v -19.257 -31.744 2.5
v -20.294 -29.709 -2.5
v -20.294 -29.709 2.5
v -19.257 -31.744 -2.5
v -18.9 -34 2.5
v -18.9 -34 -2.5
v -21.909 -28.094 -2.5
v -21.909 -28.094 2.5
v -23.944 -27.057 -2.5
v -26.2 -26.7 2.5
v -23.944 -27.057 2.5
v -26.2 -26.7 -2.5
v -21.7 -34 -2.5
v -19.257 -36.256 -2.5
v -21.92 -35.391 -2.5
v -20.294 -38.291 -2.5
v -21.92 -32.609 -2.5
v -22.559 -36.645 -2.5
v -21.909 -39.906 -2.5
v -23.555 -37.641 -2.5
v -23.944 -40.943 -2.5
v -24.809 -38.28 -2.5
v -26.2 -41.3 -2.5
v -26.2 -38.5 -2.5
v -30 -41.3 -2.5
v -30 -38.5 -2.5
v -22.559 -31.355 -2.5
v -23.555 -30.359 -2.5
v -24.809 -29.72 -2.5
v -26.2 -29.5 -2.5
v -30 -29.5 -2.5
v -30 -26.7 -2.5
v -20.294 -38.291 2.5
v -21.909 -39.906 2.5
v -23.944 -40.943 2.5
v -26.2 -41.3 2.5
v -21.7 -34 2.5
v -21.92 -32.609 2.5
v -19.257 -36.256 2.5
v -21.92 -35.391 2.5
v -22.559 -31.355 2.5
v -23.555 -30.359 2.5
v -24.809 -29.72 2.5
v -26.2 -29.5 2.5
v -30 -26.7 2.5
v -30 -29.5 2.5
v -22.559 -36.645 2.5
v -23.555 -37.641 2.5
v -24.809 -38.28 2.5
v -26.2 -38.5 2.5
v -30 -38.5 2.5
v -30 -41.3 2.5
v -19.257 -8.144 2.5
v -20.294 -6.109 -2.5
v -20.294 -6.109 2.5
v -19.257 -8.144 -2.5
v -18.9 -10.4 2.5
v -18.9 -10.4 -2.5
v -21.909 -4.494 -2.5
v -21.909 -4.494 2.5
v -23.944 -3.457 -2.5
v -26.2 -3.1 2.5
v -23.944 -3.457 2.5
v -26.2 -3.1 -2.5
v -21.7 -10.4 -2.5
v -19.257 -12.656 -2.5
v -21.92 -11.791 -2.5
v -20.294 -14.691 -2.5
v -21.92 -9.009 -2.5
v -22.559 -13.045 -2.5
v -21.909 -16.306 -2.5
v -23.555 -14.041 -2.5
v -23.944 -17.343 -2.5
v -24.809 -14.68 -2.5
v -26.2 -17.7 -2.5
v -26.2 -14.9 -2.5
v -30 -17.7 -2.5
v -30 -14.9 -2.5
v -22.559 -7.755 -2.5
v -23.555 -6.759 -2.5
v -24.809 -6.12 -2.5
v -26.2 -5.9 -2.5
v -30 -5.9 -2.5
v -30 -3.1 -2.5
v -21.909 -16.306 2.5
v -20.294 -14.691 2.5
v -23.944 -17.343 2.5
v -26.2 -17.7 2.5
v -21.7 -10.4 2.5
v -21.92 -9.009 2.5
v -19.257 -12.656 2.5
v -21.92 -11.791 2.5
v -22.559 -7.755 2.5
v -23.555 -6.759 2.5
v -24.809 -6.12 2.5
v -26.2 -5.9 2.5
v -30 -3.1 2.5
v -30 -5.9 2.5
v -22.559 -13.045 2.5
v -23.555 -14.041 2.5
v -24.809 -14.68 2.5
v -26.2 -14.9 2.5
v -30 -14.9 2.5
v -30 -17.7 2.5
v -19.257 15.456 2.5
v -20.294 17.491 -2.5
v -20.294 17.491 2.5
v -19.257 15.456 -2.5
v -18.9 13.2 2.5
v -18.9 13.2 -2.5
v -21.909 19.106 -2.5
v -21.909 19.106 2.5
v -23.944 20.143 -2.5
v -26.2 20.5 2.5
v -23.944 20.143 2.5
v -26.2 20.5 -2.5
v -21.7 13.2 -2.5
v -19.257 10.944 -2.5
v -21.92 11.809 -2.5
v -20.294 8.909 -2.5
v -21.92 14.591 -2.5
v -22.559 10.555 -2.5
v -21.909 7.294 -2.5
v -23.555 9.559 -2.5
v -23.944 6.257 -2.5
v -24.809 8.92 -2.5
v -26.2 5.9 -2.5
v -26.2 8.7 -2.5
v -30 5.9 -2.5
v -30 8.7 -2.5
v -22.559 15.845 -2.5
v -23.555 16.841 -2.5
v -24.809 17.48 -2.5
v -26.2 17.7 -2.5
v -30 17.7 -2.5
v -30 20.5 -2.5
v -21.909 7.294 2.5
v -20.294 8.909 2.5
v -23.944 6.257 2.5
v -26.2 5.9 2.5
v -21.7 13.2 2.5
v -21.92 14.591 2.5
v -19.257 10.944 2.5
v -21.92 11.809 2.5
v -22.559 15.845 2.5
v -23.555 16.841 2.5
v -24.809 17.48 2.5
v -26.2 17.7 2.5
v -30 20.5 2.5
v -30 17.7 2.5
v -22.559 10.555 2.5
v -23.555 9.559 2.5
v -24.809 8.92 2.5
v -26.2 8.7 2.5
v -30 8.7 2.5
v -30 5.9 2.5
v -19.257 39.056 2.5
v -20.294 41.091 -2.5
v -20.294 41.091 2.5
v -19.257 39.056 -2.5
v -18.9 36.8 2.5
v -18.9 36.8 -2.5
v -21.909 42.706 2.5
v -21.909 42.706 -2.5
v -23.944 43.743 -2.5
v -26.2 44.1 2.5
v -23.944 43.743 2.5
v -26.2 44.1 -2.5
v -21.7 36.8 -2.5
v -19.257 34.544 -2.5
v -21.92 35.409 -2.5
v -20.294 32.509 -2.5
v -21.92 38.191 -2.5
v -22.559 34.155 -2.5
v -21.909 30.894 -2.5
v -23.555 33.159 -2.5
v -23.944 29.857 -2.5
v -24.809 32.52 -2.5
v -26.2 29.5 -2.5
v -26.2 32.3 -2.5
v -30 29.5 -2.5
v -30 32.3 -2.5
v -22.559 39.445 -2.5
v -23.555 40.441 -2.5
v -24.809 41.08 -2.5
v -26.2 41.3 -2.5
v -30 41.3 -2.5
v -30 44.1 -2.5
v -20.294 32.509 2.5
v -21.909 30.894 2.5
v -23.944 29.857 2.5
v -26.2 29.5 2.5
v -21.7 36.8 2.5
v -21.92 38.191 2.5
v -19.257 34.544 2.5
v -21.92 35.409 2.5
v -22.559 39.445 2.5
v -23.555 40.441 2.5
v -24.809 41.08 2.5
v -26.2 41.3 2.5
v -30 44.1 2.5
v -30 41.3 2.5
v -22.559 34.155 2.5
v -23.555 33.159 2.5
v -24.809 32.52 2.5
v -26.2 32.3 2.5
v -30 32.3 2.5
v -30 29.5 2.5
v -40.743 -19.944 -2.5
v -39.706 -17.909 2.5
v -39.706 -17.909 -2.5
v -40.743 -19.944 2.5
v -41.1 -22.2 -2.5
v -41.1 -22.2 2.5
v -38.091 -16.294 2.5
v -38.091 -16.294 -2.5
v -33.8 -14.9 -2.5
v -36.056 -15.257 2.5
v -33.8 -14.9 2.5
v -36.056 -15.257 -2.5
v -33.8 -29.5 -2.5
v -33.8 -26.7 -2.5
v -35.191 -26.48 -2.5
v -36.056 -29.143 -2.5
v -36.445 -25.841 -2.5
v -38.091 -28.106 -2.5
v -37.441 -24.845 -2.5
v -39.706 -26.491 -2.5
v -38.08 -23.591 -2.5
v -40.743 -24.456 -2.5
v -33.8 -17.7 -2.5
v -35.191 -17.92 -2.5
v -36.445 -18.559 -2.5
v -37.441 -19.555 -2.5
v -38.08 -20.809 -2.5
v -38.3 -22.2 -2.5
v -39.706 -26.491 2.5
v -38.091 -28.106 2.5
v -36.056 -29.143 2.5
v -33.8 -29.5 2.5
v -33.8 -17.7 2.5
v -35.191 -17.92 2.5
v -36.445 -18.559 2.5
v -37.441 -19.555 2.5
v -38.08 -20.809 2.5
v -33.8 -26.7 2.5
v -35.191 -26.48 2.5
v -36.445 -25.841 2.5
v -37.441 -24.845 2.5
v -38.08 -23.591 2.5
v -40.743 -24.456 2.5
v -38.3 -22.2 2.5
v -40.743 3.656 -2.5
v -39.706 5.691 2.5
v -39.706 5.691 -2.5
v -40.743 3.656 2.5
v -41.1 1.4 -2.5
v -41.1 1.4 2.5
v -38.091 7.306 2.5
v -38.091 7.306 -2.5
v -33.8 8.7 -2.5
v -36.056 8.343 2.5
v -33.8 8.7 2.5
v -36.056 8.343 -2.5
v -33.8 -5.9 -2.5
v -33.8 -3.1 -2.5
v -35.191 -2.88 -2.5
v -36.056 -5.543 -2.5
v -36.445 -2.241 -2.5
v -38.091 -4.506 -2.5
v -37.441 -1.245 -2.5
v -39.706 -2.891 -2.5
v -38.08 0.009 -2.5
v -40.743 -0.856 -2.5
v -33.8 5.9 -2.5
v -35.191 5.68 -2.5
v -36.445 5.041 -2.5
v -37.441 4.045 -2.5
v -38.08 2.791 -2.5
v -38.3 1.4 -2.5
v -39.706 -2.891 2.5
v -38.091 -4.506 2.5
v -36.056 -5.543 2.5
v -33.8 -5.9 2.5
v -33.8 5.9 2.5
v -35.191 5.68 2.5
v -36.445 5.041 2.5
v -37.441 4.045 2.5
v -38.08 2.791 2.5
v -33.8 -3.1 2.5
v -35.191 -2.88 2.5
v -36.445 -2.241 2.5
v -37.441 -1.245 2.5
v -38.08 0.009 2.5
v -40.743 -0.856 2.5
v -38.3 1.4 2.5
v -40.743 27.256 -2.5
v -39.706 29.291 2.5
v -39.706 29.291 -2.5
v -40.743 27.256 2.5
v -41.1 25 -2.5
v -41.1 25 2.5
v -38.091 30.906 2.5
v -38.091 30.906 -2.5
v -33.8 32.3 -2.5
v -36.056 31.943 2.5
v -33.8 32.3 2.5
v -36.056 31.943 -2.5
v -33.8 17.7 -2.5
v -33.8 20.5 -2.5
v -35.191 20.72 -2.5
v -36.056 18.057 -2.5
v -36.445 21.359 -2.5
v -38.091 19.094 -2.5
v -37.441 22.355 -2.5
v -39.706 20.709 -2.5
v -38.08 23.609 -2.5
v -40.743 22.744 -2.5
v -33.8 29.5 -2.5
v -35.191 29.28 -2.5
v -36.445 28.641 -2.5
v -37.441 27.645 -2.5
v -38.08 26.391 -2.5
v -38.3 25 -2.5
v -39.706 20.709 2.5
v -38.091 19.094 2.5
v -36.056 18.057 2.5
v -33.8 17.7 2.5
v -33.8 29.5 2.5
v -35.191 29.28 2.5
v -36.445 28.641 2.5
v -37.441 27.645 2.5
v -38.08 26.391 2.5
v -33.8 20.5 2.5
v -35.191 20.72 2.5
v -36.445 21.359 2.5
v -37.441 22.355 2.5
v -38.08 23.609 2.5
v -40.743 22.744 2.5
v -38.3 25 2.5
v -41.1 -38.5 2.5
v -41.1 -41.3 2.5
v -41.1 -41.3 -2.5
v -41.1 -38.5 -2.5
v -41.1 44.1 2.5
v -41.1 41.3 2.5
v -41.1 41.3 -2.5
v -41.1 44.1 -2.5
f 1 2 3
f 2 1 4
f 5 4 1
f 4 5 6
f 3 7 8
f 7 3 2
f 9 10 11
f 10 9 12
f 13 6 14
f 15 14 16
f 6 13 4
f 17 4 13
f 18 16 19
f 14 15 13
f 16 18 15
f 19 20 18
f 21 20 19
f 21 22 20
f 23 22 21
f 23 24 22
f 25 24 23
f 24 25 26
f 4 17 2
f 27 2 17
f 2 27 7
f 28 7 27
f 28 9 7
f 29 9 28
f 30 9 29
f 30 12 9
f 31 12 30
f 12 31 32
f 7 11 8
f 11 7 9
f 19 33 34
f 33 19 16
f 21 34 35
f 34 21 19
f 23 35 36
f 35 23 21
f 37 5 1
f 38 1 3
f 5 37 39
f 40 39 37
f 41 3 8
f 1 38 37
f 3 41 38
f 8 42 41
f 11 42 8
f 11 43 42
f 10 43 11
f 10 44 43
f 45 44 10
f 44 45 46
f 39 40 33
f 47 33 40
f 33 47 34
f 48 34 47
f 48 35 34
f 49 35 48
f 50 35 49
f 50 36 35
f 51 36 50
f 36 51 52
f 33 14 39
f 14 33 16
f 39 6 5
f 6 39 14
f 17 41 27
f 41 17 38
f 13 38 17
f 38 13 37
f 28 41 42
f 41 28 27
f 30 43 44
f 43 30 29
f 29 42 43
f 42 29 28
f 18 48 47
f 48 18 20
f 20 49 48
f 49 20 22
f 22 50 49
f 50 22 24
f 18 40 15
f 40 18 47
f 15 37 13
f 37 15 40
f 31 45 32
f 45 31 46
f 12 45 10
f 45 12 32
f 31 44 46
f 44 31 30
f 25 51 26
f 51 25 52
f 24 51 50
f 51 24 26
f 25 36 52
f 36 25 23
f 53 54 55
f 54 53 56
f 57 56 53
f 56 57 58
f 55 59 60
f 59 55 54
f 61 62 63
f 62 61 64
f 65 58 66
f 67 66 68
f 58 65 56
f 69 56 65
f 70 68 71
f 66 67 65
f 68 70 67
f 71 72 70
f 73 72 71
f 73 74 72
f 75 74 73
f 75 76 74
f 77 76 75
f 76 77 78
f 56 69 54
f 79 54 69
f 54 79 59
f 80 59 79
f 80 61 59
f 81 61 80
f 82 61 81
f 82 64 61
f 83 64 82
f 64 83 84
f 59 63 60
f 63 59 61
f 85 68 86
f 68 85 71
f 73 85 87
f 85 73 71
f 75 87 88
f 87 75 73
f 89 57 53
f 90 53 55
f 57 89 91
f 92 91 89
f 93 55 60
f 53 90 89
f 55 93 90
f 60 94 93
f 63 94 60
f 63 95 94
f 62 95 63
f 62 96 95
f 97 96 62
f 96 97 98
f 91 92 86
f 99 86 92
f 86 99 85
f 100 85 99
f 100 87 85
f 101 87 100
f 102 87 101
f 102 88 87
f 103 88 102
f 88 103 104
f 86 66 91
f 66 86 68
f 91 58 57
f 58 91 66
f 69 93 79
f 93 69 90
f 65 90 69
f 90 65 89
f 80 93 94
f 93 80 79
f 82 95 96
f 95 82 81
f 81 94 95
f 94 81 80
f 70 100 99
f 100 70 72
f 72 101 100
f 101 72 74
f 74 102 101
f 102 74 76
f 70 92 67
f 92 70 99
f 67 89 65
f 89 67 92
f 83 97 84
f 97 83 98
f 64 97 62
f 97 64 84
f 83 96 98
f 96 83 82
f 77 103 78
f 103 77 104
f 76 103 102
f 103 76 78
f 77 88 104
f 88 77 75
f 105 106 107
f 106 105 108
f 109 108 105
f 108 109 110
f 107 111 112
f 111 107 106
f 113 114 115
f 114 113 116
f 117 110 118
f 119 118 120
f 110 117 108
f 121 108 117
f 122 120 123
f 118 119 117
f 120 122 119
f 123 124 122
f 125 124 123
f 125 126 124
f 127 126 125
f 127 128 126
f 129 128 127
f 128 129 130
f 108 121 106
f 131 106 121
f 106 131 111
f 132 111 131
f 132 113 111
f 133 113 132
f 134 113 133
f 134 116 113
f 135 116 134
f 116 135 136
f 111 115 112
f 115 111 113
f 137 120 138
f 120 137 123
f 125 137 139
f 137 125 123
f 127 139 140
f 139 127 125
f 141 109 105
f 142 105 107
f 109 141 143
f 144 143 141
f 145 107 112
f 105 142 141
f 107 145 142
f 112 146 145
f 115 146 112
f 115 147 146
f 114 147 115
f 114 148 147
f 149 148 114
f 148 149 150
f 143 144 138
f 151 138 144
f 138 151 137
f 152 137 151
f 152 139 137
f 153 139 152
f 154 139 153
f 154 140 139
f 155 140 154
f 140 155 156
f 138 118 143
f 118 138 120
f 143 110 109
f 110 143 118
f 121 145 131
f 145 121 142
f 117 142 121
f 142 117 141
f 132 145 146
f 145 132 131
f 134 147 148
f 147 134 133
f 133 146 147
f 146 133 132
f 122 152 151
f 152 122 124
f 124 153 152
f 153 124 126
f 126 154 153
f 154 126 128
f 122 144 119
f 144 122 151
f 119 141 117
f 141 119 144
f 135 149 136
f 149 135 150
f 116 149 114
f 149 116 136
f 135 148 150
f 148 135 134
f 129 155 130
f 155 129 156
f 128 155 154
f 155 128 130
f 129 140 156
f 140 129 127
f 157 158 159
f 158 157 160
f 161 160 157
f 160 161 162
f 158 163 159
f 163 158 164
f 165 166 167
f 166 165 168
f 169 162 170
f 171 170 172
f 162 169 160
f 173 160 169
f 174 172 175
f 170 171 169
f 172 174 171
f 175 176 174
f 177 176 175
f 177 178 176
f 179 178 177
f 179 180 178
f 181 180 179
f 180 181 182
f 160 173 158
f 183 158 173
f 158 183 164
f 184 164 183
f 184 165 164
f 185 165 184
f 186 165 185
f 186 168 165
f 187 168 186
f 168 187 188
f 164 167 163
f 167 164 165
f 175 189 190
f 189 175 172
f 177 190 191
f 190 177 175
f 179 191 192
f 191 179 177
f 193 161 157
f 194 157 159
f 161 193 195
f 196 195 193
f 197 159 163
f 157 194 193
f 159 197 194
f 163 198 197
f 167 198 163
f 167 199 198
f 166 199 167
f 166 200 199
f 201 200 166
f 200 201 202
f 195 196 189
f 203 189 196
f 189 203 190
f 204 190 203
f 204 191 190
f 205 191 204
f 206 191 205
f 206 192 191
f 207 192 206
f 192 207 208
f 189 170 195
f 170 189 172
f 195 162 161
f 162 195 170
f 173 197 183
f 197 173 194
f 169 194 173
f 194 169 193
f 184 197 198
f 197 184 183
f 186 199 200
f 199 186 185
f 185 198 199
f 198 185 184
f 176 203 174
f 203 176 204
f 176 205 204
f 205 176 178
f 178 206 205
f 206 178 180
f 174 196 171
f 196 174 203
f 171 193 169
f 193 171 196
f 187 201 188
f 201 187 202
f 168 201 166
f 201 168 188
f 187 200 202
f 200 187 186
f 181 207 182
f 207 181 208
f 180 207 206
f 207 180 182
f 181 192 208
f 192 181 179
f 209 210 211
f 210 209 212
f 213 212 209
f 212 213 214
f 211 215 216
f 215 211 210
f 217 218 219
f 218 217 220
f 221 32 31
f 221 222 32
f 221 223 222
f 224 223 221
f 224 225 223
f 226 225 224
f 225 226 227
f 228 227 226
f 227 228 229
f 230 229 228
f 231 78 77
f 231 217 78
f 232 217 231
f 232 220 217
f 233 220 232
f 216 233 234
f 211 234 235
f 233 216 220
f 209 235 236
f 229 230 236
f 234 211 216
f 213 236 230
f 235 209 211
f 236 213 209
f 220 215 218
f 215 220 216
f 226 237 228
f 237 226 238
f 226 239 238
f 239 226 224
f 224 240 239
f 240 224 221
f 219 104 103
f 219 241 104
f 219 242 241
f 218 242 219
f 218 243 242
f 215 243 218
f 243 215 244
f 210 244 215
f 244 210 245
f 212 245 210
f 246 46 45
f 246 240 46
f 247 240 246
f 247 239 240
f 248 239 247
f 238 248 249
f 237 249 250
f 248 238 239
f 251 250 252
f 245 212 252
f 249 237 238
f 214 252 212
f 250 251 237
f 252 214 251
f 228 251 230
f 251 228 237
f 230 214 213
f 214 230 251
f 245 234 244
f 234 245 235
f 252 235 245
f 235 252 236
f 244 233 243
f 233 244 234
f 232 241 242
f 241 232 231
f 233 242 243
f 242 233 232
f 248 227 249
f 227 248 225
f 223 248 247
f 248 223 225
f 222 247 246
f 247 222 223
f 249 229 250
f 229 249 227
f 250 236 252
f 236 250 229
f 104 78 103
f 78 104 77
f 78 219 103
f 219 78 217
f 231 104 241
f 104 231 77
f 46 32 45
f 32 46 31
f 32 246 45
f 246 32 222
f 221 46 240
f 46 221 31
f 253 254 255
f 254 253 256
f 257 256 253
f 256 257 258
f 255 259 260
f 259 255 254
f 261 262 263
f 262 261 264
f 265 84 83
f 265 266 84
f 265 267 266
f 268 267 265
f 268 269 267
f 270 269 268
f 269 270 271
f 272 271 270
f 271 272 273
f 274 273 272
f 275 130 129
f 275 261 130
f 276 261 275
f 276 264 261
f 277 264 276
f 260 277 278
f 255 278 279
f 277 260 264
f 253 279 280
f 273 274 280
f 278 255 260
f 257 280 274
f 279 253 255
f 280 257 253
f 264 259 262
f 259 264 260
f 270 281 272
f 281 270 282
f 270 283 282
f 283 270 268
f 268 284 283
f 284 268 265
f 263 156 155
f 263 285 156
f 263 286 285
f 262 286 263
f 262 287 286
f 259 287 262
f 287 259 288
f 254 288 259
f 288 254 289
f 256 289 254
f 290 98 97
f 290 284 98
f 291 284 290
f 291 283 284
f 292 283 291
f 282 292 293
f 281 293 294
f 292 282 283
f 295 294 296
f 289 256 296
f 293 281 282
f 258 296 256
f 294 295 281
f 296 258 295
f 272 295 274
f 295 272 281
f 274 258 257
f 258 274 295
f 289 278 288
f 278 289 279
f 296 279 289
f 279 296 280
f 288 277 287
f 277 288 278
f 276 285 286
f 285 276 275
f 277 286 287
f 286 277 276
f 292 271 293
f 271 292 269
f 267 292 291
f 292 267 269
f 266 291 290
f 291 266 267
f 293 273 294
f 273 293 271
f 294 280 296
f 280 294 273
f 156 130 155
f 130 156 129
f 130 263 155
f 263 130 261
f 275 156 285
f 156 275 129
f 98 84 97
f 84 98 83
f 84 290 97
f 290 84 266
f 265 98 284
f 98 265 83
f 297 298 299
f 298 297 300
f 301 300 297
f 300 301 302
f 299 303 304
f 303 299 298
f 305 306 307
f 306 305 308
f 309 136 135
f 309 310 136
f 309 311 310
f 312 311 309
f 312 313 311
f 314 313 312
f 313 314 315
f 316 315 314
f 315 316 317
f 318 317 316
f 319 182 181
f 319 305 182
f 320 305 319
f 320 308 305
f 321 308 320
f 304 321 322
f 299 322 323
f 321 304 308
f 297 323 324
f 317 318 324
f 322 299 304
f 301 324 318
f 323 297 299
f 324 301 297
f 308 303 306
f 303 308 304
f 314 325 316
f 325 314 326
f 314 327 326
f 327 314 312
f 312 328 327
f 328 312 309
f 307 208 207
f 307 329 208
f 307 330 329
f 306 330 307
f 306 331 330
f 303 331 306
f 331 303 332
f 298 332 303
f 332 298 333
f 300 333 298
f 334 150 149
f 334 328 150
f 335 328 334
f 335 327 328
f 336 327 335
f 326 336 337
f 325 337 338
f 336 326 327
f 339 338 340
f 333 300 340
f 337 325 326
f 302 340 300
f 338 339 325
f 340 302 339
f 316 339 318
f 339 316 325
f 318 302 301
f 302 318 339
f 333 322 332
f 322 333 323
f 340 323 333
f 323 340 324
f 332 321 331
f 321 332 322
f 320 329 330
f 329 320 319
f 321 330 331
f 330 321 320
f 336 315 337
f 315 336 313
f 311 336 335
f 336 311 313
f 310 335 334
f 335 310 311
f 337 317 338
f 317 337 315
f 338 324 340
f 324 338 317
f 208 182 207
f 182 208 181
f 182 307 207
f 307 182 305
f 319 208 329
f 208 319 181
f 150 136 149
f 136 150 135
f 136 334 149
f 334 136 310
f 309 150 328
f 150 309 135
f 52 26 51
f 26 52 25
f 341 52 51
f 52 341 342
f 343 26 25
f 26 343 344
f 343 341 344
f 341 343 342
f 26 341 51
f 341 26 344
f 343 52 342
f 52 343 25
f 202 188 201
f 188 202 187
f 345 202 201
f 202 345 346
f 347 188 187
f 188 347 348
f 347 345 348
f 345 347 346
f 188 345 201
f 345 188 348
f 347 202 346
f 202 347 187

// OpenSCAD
//---------------------------------------------------------------------------------------------
//-- Printable parameterized spring
//-- (c) Juan Gonzalez-Gomez (Obijuan) juan@iearobotics.com
//-- April-2012
//---------------------------------------------------------------------------------------------
//-- Proof of concept
//---------------------------------------------------------------------------------------------


//-- Spring folds. It is implemented by means of arcs
//-- It consist of two parts: the arc and the arms
//-- r = Inner arc radius
//-- th = thickness
//-- w = width
//-- arc_len = Length of the two arms
module spring_arc(arm_len, r, th, w)
{
  //-- outer radius
  or = r + th; 

  translate([arm_len,or,0])
  union() {

    //-- Arc
    difference() {
      cylinder(r=or, h=w, center=true, $fn=20);

      translate([-or,0,0])
          cube([2*or, 2*or+2, w+2],center=true);

      cylinder(r=r, h=w+10, center=true, $fn=20);

    }

    //-- Arms
    translate([-arm_len/2,th/2+r,0])
      cube([arm_len,th,w],center=true);

    translate([-arm_len/2,-th/2-r,0])
      cube([arm_len,th,w],center=true);
  }
}

//---------------------------------------------------------
//-- This module creates the spring, with a square section
//-- and no drills
//-- Spring parameters:
//--  -fid: Fold inner diameter
//--  -th: thickness 
//--  -folds: Number of folds: starting from 1
//--  -lx,lz: Spring length on x and z axes respectively
//--------------------------------------------------------
module parametric_spring_common(fid=3, th=2, folds=8, lx=20, lz=20)
{

  step = 2*(fid + th);
  arm_len = (lx - fid - 2*th)/2;
  ly = folds*step/2;

  translate([0,-ly/2,0])
  union() {

    //-- Right folds
    for (i=[1:ceil(folds/2)]) {
      translate([0, (i-1)*step,0])
        spring_arc(arm_len=arm_len, r=fid/2, th=th, w=lz);
    }

    //-- left folds
    if (folds>1) {
      for (i=[1:floor(folds/2)]) {
        translate([0, (i-1)*step+step/2,0])
          mirror([1,0,0])
          spring_arc(arm_len=arm_len, r=fid/2, th=th, w=lz);
      }
    }

    translate([-lx/4,th/2,0])
      cube([lx/2,th,lz], center=true);

    if ((folds%2)==0)
      translate([lx/4, th/2+(step/2)*folds,0])
        cube([lx/2,th,lz], center=true);
    else
      translate([-lx/4, th/2+(step/2)*folds,0])
        cube([lx/2,th,lz], center=true);
  }
}

module teardrop(r,h)
{
  $fa=15.0;
  $fs=0.1;

  diameter=2*r;

  translate([0,0,-h/2])
  linear_extrude(height=h, center=false, convexity=10)
  difference() {
    union() {
      circle(r=diameter/2);
      rotate(45) square(size=diameter/2,center=false);
    }
    translate([-diameter/2,diameter/2]) square(size=diameter);
  }
}

module pipe(hexa_diam=12, len=5, offs=0, sides=6)
{
  out_diam = 4*(hexa_diam/2 * cos(360/(2*sides)));


  difference() {
    rotate([90,0,0])
     cylinder(r=out_diam/2, h=len+10,center=true, $fn=sides);

    rotate([90,0,0])
     cylinder(r=hexa_diam/2+offs, h=len+15,center=true, $fn=sides);
  }
}

//---------------------------------------------
//-- Spring MAIN MODULES!
//-- Common parameters:
//--     -fid = folder inner diameter
//--     -th = thickness
//--     -folds = Number of folds in the spring
//--     -drill = Inner drill
//---------------------------------------------


//-------------------------------------
//-- Spring with a squeare section
//-- Specific parameters:
//--    lx, lz : square lenths
//-------------------------------------
module spring_square(fid=3, th=2, folds=8, lx=20, lz=20,drill=8)
{
  step = 2*(fid + th);
  arm_len = (lx - fid - 2*th)/2;
  ly = folds*(fid + th);
  echo(ly);

  difference() {
    parametric_spring_common(fid=fid,th=th, folds=folds, lx=lx, lz=lz);

    rotate([90,0,0])
      teardrop(r=drill/2,h=ly+10);
      //cylinder(r=drill/2, h=ly+10, center=true, $fn=20);
  }
}

//-----------------------------------------------------------------------
//-- Spring with an hexagonal section 
//-- Specific parameters:
//--    hexa_diam: external diameter
//--    offs: Additional distance added to the hexa_diam to 
//--      for changing the shape. When offs=0, it is a regular hexagon
//----------------------------------------------------------------------
module spring_hexagonal(fid=3, th=2, folds=8, hexa_diam=13 ,drill=8,offs=0)
{
   ly = folds*(fid + th);
  lx = hexa_diam;
  lz = 2*(hexa_diam/2 * cos(30));
  step = 2*(fid + th);
  arm_len = (lx - fid - 2*th)/2;
 

  difference() {
    parametric_spring_common(fid=fid,th=th, folds=folds, lx=lx, lz=lz);

    rotate([90,0,0])
      //cylinder(r=drill/2, h=ly+10, center=true, $fn=20);
      teardrop(r=drill/2,h=ly+10);

    pipe(hexa_diam=hexa_diam, len=ly,offs=offs,sides=6);
  }
}


//-----------------------------------------------------------------------
//-- Spring with an octogonal section 
//-- Specific parameters:
//--    hexa_diam: external diameter
//--    offs: Additional distance added to the hexa_diam to 
//--      for changing the shape. When offs=0, it is a regular hexagon
//----------------------------------------------------------------------
module spring_octogonal(fid=3, th=2, folds=8, hexa_diam=13 ,drill=8,offs=0)
{
   ly = folds*(fid + th);
  lx = hexa_diam;
  lz = 2*(hexa_diam/2 * cos(30));
  step = 2*(fid + th);
  arm_len = (lx - fid - 2*th)/2;
  echo(ly);

  difference() {
    parametric_spring_common(fid=fid,th=th, folds=folds, lx=lx, lz=lz);

    rotate([90,0,0])
      //cylinder(r=drill/2, h=ly+10, center=true, $fn=20);
      teardrop(r=drill/2,h=ly+10);

    rotate([0,45/2,0])
    pipe(hexa_diam=hexa_diam, len=ly,offs=offs, sides=8);
  }
}

//-- Example springs!

translate([-30,0,0])
spring_square(fid=9, th=2.8, folds=7, lx=22.2, lz=5, drill=0);

/*
//-- This is the one used as a z axis spring on the Prusa Mendel
translate([0,0,0])
spring_hexagonal(fid=3, th=2, folds=4, hexa_diam=14.6, drill=8, offs=0);

translate([30,0,0])
spring_octogonal(fid=4, th=2, folds=6, hexa_diam=22, drill=14);
*/
